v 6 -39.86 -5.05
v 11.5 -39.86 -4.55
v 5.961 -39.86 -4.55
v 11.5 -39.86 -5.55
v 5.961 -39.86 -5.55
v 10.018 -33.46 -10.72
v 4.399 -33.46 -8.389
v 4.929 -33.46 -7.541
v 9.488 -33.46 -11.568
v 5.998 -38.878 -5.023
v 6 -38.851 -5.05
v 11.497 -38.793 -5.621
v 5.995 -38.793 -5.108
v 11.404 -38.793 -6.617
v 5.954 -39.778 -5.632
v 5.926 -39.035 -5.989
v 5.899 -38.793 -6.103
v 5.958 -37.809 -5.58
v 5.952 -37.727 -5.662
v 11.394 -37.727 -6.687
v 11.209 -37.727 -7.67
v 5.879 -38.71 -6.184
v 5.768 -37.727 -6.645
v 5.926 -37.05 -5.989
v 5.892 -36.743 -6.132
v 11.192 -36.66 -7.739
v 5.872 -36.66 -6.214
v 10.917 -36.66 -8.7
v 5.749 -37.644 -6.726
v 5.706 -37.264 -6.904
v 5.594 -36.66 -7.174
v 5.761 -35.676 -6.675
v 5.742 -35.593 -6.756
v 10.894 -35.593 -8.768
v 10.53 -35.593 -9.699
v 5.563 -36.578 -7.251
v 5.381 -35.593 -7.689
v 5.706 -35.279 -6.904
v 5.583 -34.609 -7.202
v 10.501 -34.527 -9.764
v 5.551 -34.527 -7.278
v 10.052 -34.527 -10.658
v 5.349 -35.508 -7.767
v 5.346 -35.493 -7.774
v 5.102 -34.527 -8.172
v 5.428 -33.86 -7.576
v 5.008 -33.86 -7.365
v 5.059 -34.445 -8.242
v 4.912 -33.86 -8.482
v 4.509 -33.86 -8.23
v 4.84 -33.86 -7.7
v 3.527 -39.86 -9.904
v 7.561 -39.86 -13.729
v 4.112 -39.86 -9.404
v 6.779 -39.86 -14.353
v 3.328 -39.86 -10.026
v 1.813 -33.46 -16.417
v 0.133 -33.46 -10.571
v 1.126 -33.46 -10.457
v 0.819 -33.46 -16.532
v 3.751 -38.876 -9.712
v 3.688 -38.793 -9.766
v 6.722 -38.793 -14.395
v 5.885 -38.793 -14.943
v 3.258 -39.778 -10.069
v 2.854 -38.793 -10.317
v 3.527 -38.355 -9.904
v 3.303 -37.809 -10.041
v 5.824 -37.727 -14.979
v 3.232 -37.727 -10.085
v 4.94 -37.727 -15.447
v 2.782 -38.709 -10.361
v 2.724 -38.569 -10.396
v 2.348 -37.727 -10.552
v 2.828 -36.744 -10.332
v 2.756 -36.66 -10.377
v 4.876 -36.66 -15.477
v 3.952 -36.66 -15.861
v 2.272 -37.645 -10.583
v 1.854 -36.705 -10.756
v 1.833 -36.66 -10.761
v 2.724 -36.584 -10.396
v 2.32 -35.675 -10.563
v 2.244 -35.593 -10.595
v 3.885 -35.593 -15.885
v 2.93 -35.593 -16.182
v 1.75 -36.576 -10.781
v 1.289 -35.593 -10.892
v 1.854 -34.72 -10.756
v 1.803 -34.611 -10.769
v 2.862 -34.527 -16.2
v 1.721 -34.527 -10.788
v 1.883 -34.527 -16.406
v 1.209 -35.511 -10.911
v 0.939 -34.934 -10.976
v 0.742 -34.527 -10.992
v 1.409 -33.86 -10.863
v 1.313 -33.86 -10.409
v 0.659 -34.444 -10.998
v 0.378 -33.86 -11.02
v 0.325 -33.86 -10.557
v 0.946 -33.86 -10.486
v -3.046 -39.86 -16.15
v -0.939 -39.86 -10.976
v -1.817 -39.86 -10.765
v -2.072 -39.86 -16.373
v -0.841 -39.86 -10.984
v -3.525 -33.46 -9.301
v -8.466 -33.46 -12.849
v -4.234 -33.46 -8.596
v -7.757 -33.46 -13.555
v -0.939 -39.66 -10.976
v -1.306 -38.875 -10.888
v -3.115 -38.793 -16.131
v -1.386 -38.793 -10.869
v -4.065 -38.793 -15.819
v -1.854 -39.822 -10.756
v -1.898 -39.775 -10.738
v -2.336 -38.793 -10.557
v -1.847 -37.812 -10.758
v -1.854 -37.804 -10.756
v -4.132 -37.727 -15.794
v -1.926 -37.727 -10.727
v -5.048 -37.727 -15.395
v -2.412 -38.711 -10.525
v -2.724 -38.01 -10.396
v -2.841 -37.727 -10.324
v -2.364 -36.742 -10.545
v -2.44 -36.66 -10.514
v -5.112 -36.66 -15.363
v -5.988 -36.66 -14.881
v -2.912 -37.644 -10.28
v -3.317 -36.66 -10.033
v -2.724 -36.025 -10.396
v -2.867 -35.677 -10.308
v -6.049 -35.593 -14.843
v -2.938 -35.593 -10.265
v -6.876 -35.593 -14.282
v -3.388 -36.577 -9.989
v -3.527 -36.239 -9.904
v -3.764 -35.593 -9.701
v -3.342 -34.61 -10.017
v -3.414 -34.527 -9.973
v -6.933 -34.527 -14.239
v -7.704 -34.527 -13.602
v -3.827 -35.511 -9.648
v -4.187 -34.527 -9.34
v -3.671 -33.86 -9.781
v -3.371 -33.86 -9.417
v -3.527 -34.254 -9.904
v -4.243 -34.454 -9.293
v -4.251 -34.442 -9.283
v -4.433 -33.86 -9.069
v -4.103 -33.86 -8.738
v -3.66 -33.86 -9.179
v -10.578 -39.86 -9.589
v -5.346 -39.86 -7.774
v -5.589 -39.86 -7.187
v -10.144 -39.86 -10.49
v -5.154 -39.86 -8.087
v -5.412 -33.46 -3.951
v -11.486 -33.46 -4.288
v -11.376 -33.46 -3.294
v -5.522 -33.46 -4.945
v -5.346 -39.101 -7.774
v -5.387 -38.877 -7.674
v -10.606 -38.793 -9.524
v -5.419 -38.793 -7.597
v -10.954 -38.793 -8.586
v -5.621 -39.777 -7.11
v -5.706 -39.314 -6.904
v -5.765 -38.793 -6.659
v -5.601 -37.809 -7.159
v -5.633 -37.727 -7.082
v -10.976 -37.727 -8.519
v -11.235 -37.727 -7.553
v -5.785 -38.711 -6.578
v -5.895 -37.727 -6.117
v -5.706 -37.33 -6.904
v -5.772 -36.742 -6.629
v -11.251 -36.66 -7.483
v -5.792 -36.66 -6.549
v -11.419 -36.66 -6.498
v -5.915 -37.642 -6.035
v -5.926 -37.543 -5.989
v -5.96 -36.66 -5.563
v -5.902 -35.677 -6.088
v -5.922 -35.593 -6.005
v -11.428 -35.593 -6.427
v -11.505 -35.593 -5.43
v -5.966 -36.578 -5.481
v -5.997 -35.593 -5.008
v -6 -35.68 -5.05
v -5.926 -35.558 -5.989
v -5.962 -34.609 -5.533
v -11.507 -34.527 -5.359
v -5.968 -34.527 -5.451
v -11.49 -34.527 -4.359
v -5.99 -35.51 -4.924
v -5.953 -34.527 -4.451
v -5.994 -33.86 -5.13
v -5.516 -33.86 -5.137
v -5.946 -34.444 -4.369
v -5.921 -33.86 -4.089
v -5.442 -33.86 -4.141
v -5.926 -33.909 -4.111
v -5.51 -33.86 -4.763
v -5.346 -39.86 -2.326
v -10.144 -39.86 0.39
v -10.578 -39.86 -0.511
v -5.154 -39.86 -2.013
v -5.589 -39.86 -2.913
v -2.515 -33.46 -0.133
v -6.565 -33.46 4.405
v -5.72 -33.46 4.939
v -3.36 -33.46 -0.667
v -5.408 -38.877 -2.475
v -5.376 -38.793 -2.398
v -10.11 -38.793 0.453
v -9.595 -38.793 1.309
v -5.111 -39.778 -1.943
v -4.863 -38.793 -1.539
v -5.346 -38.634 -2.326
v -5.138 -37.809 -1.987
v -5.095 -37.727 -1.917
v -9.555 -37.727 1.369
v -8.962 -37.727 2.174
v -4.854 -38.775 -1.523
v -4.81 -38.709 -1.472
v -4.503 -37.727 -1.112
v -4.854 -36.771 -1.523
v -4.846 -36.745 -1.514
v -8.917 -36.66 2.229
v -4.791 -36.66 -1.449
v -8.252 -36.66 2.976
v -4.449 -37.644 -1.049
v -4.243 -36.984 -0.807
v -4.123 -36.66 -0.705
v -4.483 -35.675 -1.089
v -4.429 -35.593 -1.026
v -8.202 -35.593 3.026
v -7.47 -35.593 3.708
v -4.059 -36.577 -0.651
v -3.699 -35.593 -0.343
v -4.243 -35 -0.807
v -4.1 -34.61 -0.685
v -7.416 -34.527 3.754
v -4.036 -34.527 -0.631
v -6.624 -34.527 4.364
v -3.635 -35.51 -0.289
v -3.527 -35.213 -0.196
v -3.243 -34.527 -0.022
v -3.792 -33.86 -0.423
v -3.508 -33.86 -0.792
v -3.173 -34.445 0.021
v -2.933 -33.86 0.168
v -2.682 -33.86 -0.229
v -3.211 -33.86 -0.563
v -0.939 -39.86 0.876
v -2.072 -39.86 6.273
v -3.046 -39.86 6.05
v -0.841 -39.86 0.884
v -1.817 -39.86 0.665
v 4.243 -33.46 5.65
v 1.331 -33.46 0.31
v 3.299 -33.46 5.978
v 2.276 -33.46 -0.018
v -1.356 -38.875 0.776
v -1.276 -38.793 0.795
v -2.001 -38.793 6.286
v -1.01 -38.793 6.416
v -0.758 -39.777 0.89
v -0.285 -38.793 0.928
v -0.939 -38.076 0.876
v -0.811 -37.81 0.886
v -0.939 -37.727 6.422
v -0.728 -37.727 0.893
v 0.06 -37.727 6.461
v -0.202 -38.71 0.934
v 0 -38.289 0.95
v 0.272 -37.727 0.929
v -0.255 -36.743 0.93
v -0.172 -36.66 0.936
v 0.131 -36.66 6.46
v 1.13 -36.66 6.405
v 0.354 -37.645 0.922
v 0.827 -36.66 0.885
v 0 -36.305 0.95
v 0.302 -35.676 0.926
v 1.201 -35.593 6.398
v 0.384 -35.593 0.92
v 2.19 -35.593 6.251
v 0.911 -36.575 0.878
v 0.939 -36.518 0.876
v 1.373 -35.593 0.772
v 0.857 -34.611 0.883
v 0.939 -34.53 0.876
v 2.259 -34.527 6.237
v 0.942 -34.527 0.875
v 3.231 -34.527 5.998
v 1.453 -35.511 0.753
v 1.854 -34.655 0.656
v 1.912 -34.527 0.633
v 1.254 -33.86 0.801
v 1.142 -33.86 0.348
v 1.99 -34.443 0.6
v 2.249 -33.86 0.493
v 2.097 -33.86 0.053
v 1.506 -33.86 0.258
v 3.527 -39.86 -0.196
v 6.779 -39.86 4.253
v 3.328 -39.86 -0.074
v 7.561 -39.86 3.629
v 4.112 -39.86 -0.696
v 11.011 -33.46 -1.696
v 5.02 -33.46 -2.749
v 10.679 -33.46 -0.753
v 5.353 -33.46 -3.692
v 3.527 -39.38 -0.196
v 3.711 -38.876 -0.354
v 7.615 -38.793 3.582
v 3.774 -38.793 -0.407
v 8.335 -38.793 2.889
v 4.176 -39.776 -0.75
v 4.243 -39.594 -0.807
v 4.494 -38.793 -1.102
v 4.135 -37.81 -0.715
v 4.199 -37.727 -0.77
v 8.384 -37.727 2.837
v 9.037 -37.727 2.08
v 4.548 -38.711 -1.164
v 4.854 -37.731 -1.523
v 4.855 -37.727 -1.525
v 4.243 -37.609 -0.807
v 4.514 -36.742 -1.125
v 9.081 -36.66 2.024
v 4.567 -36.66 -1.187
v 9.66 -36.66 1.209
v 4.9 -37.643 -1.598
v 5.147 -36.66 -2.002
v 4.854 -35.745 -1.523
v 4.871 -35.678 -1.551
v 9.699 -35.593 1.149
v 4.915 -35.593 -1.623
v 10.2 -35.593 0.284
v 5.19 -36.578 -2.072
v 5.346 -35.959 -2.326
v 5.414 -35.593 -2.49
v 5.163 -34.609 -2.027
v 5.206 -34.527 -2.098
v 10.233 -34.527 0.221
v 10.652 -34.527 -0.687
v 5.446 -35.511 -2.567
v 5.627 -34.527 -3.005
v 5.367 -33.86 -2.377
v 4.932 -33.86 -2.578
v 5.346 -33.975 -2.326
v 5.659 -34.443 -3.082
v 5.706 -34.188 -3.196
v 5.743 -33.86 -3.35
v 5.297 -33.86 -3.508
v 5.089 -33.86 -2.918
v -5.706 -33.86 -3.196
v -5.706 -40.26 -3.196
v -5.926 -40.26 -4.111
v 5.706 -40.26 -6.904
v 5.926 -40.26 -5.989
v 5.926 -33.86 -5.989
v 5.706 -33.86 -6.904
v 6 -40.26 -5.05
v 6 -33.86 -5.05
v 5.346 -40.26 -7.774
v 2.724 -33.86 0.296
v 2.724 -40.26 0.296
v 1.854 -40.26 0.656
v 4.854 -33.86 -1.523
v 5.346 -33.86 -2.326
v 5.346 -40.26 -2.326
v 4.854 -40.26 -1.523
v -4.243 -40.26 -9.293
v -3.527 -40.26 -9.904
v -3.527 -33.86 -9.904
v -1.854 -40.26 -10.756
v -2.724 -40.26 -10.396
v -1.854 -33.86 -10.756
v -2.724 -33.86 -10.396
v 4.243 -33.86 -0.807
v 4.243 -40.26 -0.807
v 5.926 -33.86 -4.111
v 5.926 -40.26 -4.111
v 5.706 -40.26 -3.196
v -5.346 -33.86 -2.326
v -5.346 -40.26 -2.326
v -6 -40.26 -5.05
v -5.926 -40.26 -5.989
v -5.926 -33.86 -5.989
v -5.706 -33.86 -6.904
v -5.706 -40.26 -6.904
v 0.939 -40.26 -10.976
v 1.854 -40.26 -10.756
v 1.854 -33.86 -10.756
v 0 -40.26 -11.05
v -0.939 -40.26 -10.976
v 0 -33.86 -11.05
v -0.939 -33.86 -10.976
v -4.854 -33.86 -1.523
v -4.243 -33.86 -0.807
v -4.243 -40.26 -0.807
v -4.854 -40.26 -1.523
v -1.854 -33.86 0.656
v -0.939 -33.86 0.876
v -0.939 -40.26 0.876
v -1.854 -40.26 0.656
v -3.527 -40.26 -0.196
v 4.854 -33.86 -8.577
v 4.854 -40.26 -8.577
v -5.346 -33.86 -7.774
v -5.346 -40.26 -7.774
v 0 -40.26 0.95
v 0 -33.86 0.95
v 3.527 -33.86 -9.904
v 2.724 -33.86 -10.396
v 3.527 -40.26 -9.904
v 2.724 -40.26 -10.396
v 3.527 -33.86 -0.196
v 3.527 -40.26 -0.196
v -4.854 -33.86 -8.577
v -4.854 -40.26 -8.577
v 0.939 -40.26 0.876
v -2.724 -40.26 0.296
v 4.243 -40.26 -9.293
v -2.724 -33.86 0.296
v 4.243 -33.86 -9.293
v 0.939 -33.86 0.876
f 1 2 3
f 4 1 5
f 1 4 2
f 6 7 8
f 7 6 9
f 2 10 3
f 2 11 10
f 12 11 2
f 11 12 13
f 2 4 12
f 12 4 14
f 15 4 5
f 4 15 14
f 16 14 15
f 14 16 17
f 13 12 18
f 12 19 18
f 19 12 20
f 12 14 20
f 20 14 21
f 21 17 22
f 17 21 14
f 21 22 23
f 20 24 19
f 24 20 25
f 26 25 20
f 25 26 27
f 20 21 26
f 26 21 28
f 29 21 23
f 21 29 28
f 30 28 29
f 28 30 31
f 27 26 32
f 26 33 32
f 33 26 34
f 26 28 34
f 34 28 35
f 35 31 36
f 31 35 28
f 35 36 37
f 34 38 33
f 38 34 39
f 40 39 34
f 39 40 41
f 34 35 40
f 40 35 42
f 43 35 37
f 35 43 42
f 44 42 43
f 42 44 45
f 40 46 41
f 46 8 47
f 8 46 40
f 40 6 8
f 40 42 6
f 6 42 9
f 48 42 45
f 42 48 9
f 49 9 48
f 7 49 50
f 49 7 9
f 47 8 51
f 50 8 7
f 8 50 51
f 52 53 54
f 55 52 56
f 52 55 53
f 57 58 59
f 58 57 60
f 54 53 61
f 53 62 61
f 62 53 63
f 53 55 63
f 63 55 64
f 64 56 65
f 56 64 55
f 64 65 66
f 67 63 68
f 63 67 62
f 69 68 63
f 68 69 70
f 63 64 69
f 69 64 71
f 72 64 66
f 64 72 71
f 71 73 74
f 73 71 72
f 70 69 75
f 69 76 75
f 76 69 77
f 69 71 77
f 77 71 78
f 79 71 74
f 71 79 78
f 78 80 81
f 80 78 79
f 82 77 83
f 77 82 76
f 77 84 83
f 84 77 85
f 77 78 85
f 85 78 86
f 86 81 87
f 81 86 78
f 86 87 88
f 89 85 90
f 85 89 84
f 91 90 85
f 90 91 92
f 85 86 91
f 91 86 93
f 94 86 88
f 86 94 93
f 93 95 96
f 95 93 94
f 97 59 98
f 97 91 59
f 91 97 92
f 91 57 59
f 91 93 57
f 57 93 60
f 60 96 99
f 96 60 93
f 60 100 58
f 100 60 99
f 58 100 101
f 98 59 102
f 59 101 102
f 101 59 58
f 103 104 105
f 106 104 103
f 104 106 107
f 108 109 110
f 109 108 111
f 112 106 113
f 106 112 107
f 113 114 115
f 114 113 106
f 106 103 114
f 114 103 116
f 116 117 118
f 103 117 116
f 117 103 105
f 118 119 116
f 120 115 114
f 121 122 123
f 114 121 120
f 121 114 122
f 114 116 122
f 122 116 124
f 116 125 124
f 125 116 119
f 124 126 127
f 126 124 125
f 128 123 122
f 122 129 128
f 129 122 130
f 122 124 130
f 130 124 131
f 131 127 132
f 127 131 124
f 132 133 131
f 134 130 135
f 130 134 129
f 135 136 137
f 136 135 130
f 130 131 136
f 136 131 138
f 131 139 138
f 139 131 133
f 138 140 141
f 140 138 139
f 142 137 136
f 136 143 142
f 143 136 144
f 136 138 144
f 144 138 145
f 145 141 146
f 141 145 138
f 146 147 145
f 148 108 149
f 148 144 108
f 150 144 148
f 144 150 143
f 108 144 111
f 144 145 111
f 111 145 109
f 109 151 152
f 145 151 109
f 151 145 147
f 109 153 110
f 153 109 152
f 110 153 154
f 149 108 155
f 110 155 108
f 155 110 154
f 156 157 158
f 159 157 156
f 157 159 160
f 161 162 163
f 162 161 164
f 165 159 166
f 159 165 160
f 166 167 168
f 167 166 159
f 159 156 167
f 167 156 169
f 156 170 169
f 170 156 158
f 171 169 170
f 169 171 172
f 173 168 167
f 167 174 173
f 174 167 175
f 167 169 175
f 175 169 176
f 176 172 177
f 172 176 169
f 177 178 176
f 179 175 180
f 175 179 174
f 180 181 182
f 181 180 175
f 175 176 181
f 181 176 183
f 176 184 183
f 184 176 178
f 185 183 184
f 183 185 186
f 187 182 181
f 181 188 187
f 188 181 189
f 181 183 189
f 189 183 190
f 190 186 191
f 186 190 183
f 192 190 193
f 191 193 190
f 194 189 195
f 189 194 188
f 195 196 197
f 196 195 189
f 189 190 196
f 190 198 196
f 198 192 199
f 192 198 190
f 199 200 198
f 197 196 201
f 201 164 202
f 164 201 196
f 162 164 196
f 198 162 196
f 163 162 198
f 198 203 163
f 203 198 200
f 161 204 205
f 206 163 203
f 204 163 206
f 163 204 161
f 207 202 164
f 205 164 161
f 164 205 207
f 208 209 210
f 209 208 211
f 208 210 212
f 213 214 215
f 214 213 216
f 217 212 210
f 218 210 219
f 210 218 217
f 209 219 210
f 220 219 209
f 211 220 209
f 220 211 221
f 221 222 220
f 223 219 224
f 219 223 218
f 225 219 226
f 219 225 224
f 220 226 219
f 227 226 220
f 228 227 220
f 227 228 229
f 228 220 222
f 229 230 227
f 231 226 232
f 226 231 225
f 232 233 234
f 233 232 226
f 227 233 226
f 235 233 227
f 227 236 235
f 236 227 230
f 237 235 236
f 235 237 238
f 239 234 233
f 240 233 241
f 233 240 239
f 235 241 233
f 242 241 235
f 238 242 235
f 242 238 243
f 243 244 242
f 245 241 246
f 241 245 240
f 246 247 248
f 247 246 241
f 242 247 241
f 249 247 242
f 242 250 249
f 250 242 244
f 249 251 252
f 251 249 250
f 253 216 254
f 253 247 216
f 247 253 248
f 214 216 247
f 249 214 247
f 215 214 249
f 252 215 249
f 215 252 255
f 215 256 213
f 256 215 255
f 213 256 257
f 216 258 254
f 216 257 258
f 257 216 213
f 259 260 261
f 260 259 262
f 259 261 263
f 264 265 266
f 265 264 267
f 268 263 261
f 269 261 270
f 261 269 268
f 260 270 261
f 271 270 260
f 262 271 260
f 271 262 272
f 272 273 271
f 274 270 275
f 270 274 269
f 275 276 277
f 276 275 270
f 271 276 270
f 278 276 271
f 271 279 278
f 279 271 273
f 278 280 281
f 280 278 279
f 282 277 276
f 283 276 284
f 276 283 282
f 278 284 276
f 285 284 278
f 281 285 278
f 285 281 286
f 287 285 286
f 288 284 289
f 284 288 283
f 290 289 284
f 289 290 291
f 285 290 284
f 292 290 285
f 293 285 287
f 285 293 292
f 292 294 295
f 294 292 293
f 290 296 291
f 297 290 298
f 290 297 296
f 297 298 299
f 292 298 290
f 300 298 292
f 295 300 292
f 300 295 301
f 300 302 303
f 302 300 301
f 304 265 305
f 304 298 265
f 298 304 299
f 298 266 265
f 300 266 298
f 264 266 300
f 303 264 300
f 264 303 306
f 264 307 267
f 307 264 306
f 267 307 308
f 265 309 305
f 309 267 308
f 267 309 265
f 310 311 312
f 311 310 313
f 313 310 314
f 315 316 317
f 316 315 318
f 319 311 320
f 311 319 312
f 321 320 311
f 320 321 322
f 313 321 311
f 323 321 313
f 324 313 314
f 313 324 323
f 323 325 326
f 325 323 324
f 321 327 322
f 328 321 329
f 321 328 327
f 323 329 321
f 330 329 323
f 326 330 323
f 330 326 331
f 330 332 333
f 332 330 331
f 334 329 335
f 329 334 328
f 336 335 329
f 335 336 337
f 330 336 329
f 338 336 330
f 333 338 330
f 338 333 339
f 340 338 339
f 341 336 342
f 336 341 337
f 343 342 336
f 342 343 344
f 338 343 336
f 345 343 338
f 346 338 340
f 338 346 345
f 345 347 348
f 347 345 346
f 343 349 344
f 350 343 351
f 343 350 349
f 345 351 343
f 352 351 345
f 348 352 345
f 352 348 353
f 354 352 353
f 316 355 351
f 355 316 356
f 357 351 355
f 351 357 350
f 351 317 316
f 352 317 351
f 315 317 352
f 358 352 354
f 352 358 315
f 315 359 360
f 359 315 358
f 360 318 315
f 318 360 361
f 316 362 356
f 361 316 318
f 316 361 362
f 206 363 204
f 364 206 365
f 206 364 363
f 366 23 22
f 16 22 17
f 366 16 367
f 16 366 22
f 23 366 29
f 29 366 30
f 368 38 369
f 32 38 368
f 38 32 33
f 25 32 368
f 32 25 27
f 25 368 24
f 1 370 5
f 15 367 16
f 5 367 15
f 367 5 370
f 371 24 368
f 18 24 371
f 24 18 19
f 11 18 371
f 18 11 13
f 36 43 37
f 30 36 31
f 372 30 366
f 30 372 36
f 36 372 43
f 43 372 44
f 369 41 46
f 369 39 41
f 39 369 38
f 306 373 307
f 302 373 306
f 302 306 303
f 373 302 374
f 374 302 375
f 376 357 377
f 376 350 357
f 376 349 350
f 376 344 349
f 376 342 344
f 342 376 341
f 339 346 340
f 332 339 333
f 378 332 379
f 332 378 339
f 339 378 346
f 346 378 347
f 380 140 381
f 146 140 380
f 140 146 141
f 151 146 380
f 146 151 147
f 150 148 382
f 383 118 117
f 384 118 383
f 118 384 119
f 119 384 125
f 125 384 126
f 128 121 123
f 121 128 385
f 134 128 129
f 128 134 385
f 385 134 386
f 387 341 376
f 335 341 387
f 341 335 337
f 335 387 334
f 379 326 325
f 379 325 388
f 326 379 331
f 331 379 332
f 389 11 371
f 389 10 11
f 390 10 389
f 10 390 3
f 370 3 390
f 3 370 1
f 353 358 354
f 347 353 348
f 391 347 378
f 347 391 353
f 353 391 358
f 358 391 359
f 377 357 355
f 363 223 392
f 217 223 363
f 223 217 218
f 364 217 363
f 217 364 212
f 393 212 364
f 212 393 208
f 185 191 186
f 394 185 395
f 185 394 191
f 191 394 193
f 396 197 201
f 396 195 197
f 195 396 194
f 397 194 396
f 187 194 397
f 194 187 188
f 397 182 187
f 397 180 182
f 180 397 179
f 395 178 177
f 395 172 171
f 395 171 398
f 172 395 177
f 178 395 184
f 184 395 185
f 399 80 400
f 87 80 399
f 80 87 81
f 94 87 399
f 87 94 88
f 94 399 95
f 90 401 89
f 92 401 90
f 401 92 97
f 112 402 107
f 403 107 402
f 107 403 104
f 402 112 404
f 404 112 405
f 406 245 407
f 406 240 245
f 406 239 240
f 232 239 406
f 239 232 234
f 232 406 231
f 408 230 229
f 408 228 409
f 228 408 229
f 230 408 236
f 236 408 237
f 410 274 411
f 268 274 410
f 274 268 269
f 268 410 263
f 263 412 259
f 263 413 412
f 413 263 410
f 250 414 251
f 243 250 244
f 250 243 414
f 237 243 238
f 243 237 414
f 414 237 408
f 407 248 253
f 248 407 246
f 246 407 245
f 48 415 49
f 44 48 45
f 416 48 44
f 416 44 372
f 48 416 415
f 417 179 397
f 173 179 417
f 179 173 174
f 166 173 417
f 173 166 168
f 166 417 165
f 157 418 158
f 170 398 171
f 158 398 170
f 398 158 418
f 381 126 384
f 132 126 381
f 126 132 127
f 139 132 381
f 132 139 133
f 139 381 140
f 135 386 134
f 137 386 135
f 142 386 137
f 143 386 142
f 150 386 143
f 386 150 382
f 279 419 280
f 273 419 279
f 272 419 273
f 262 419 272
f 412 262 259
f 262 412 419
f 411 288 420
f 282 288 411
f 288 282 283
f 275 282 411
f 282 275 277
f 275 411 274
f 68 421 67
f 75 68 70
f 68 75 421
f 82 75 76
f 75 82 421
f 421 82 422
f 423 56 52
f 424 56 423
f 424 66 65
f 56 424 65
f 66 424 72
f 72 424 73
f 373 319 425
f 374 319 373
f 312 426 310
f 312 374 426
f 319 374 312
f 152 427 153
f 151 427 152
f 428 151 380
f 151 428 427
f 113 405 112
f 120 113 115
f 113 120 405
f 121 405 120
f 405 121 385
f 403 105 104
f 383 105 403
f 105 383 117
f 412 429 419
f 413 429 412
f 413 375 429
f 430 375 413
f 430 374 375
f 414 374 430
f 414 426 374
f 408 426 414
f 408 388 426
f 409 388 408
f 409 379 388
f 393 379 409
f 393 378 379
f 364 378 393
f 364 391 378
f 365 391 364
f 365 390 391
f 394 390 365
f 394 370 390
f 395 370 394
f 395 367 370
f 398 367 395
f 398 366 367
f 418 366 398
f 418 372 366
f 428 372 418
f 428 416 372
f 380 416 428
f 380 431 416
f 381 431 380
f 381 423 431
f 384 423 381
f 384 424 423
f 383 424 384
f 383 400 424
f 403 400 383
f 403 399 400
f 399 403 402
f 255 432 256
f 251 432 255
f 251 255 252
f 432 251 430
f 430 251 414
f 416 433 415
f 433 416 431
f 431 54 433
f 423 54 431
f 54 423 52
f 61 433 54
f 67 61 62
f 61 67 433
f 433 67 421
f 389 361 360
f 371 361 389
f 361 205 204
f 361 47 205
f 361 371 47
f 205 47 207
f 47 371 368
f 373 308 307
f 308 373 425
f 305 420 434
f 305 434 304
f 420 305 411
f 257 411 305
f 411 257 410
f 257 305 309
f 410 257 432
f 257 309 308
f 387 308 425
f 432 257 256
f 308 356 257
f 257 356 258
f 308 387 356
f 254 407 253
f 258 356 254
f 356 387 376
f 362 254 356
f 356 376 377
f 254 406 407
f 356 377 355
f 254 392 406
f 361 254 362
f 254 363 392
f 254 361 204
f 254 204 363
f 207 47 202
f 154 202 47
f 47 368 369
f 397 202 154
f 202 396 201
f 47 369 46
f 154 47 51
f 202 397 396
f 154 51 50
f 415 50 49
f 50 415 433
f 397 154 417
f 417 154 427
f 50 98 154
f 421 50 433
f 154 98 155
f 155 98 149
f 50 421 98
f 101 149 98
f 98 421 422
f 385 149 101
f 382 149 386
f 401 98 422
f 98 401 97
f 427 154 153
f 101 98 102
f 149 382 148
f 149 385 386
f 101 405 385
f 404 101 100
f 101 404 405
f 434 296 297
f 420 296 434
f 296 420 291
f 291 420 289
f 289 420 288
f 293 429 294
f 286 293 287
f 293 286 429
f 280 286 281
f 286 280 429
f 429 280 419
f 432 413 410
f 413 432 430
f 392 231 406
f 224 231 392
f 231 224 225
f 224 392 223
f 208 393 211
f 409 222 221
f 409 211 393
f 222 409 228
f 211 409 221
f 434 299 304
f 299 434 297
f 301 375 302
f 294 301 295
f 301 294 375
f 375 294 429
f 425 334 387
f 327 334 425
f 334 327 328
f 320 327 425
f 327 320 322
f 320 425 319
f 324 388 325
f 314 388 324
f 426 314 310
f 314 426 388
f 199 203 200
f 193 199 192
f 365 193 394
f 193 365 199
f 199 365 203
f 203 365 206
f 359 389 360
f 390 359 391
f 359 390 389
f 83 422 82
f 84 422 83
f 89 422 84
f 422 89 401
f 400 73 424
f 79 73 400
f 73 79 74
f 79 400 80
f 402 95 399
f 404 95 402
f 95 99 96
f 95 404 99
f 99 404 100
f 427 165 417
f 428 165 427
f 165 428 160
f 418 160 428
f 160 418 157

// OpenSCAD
// file: lib/fans.scad
// Fan models for the preview only.

// 4010 blower like the Creality Ender 3 stock part-cooling fan: square 40 x 40 body with rounded corners,
// round intake on the outer face, outlet towards -Z at the +Y end. Profile in the YZ plane.
// body_y = [y0, y1] of the body, z0 = bottom edge (rests in the cradle), c = impeller axis [y, z],
// outlet = [y0, y1] of the outlet opening, ears = [y, z] of the mounting holes.
module blower_4010(x0, t, c, body_y, z0, outlet, ears, impeller = true) {
    side = body_y[1] - body_y[0];
    module profile() offset(r = 3.5) offset(delta = -3.5) translate([body_y[0], z0]) square([side, side]);
    module on_x(h, z = 0) translate([x0 + z, 0, 0]) rotate([90, 0, 90]) linear_extrude(height = h) children();
    difference() {
        on_x(t) profile();
        // mounting holes
        for (o = ears) on_x(t + 2, -1) translate(o) circle(d = 3.4, $fn = 20);
        // impeller pocket, open on the outer face (1 mm back wall)
        on_x(t - 1.0, 1.0 + 0.01) translate(c) circle(d = 27, $fn = 64);
        // outlet
        translate([x0 + 1.2, outlet[0] + 0.3, z0 - 0.01]) cube([t - 2.4, outlet[1] - outlet[0] - 1.5, 5]);
    }
    // raised rim around the intake
    on_x(0.4, t) translate(c) difference() { circle(d = 31, $fn = 64); circle(d = 27, $fn = 64); }
    if (impeller) blower_4010_impeller(x0, t, c);
}

// Blower impeller (separate part so it can spin): axis parallel to X through (c[0], c[1]).
module blower_4010_impeller(x0, t, c) {
    module on_x(h, z = 0) translate([x0 + z, 0, 0]) rotate([90, 0, 90]) linear_extrude(height = h) children();
    // back disc, forward-curved blades (30 of them), hub and its label
    on_x(0.6, 1.05) translate(c) circle(d = 26, $fn = 64);
    on_x(t - 3.2, 1.6) translate(c) for (i = [0 : 29]) rotate(i * 12)
        translate([7.2, 0]) rotate(28) square([5.6, 0.7]);
    on_x(t - 2.4, 1.6) translate(c) circle(d = 11.5, $fn = 32);
    on_x(0.3, t - 0.8) translate(c) circle(d = 10.6, $fn = 32);
}

// 2510 axial fan: axis along +Z, intake face at z = 0, centred in XY.
module axial_2510(side = 25, height = 10, blades = true) {
    r_corner = 1.6;
    module rounded_square(l) offset(r = r_corner) square(l - 2 * r_corner, center = true);
    difference() {
        linear_extrude(height = height) rounded_square(side);
        // corner recess between the two flanges (this is what forms the mounting ears)
        translate([0, 0, 2]) linear_extrude(height = height - 4)
            difference() { square(side + 2, center = true); circle(d = side + 1.2, $fn = 64); }
        // blade opening
        translate([0, 0, -1]) cylinder(d = 23.6, h = height + 2, $fn = 64);
        // mounting holes (20 mm apart)
        for (x = [-10, 10], y = [-10, 10]) translate([x, y, -1]) cylinder(d = 2.6, h = height + 2, $fn = 16);
    }
    if (blades) axial_2510_rotor(height);
    // motor and motor-mount spokes on the back face
    translate([0, 0, height - 2.6]) cylinder(d = 10, h = 2.6, $fn = 40);
    translate([0, 0, height - 1.2]) for (a = [45, 165, 285]) rotate(a) translate([5, -0.6, 0]) cube([7.2, 1.2, 1.2]);
}

// 2510 hub and blades (separate part so it can spin): axis = Z.
module axial_2510_rotor(height = 10) {
    translate([0, 0, 0.8]) cylinder(d = 12, h = height - 3.6, $fn = 40);
    translate([0, 0, 1.2]) for (i = [0 : 6]) rotate(i * 360 / 7)
        linear_extrude(height = height - 3.6, twist = -32, slices = 6) translate([5.5, -0.5]) square([6.0, 1.0]);
}

// Flat variant: the same 4010 blower sitting on its bottom edge with the intake facing the front (-Y),
// like the 2510 hotend fan. x0 = inner side, y0 = front face (intake), z0 = bottom edge.
// Profile in the XZ plane, measured from (x0, z0): c = impeller axis, outlet = [from, to] along the bottom edge
// (at the inner end), ears = mounting holes. The outlet points down (-Z) into the adapter.
module blower_4010_front(x0, y0, z0, t = 10, side = 40, c = [21.2, 19.0], outlet = [1.2, 16.2],
                   ears = [[3.6, side - 3.6], [side - 3.6, 3.6]], impeller = true) {
    module profile() {
        offset(r = 3.5) offset(delta = -3.5) square([side, side]);
        square([outlet[1] + 1.2, 6]);                  // square corner where the outlet spout is
    }
    // w = 0 at the back face (y0 + t), w = t at the front face (y0)
    module on_y(h, w = 0) translate([x0, y0 + t, z0]) rotate([90, 0, 0]) translate([0, 0, w]) linear_extrude(height = h) children();
    difference() {
        on_y(t) profile();
        for (o = ears) on_y(t + 2, -1) translate(o) circle(d = 3.4, $fn = 20);   // mounting holes
        on_y(t - 1.0, 1.0 + 0.01) translate(c) circle(d = 27, $fn = 64);          // impeller pocket, open at the front
        translate([x0 + outlet[0], y0 + 1.2, z0 - 0.01]) cube([outlet[1] - outlet[0], t - 2.4, 5]);   // outlet
    }
    on_y(0.4, t) translate(c) difference() { circle(d = 31, $fn = 64); circle(d = 27, $fn = 64); }   // rim round the intake
    if (impeller) blower_4010_front_impeller(x0, y0, z0, t, c);
}

// Blower impeller (separate part so it can spin): axis parallel to Y through (x0 + c[0], z0 + c[1]).
module blower_4010_front_impeller(x0, y0, z0, t = 10, c = [21.2, 19.0]) {
    module on_y(h, w = 0) translate([x0, y0 + t, z0]) rotate([90, 0, 0]) translate([0, 0, w]) linear_extrude(height = h) children();
    // back disc, forward-curved blades (30 of them), hub and its label
    on_y(0.6, 1.05) translate(c) circle(d = 26, $fn = 64);
    on_y(t - 3.2, 1.6) translate(c) for (i = [0 : 29]) rotate(i * 12) translate([7.2, 0]) rotate(28) square([5.6, 0.7]);
    on_y(t - 2.4, 1.6) translate(c) circle(d = 11.5, $fn = 32);
    on_y(0.3, t - 0.8) translate(c) circle(d = 10.6, $fn = 32);
}
// main file
// color: #2a2a2d
// PREVIEW ONLY: 2510 rotor (spins in the animation; axis = Y through x 0, z -5.05).
include <lib/fans.scad>

translate([0, -27.06 - 4.0 - 10, -5.05]) rotate([-90, 0, 0]) axial_2510_rotor();
